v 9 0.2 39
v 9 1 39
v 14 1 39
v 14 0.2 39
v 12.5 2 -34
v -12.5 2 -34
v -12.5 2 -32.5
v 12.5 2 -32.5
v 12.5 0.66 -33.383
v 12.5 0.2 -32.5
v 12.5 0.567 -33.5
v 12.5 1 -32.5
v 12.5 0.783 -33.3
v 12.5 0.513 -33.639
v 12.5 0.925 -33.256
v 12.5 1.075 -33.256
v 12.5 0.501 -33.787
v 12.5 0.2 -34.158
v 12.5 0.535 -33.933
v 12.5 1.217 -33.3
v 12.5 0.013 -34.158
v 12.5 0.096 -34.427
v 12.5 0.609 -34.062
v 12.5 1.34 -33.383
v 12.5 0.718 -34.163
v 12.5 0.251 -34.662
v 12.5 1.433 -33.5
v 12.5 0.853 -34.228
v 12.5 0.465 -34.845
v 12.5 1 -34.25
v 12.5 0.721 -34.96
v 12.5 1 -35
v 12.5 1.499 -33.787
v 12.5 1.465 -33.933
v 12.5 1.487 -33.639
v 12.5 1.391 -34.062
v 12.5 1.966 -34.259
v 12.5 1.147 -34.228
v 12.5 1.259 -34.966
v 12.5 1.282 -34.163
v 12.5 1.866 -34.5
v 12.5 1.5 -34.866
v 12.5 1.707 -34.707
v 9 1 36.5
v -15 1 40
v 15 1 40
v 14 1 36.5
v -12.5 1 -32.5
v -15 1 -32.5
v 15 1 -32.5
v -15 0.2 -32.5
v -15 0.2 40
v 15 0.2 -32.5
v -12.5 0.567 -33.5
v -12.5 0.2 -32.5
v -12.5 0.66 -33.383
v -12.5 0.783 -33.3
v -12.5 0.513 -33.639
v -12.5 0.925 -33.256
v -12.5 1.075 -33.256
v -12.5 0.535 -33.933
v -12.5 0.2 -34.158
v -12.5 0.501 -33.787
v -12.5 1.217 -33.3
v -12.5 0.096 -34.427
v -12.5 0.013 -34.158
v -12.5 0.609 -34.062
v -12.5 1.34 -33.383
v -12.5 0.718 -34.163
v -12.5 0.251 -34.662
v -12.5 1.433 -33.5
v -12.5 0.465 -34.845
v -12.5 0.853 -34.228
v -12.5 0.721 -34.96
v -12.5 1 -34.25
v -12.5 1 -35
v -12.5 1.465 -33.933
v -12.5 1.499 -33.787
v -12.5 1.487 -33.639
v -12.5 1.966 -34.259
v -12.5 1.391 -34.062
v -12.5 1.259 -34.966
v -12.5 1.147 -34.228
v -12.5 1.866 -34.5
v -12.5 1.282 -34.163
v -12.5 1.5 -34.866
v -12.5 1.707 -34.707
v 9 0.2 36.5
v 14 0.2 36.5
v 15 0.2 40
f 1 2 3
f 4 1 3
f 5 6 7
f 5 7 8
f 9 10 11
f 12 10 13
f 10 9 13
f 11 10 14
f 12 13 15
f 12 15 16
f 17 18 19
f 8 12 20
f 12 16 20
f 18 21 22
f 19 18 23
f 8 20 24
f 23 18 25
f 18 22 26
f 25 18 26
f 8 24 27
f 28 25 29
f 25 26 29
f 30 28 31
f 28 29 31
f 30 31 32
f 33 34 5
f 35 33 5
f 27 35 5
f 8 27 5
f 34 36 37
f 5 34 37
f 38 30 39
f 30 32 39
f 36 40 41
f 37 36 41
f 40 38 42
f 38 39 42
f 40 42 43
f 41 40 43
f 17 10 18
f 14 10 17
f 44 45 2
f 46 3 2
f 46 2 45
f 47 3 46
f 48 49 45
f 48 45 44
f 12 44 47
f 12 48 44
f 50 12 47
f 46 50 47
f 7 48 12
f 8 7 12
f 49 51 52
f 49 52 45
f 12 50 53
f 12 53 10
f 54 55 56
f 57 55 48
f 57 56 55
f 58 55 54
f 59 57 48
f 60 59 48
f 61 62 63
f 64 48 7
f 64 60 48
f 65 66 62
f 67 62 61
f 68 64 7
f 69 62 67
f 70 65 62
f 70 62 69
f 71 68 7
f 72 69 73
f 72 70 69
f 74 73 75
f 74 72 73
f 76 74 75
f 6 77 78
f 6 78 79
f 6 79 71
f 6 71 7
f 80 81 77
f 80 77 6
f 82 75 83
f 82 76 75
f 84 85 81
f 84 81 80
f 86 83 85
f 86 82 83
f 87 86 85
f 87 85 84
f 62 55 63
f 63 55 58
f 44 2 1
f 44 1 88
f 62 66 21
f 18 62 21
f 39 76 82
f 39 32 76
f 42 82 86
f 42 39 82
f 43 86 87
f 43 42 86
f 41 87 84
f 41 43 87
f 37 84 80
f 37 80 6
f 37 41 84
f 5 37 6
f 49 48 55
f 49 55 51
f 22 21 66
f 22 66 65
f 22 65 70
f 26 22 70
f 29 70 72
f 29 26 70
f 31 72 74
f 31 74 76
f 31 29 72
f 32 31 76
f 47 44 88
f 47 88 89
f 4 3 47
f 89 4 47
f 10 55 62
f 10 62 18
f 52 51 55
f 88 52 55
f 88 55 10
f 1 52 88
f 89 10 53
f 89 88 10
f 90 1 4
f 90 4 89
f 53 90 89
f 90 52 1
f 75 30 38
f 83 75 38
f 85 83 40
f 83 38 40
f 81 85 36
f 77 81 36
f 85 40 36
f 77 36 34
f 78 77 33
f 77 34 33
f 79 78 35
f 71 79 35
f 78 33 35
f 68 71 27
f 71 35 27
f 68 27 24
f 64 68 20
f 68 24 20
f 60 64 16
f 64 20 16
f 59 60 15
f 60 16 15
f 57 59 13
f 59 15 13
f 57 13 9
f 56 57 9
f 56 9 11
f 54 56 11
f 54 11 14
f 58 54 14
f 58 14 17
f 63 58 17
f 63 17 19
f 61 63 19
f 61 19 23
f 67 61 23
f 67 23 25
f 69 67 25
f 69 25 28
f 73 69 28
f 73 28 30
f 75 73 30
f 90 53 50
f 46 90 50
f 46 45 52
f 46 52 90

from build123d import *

# Parameters (mm, degrees)
SKETCH1_W           = 30
SKETCH1_H           = 70
BOSS_EXTRUDE1_DEPTH = 1
SKETCH2_W           = 30
SKETCH2_H           = 2.5
BOSS_EXTRUDE2_DEPTH = 1
SKETCH3_R           = 0.5
CUT_EXTRUDE1_DEPTH  = 30
SKETCH4_W           = 2.5
SKETCH4_H           = 2
CUT_EXTRUDE2_DEPTH  = 2.5
FILLET1_R           = 1
SKETCH5_W           = 30
SKETCH5_H           = 1
BOSS_EXTRUDE3_DEPTH = 5
FILLET2_R           = 1
SKETCH6_W           = 5
SKETCH6_H           = 2.5
CUT_EXTRUDE3_DEPTH  = 1
SKETCH7_W           = 30
SKETCH7_H           = 74.158210877
CUT_EXTRUDE4_DEPTH  = 0.2


with BuildPart() as part:
    # Sketch1 → Boss-Extrude1 (new body)
    with BuildSketch(Plane(origin=(0, 0, 0), x_dir=(1, 0, 0), z_dir=(0, 1, 0))):
        Rectangle(SKETCH1_W, SKETCH1_H)
    extrude(amount=BOSS_EXTRUDE1_DEPTH)

    # Sketch2 → Boss-Extrude2 (add)
    with BuildSketch(Plane(origin=(0, 1, 0), x_dir=(1, 0, 0), z_dir=(0, 1, 0))):
        with Locations((0, 33.75)):
            Rectangle(SKETCH2_W, SKETCH2_H)
    extrude(amount=BOSS_EXTRUDE2_DEPTH)

    # Sketch3 → Cut-Extrude1 (cut)
    with BuildSketch(Plane(origin=(15, 0, 0), x_dir=(0, 0, -1), z_dir=(1, 0, 0))):
        with Locations((33.75, 1)):
            Circle(SKETCH3_R)
    extrude(amount=-CUT_EXTRUDE1_DEPTH, mode=Mode.SUBTRACT)

    # Sketch4 → Cut-Extrude2 (cut)
    with BuildSketch(Plane(origin=(0, 0, -35), x_dir=(-1, 0, 0), z_dir=(0, 0, -1))):
        with Locations((-13.75, 1)):
            Rectangle(SKETCH4_W, SKETCH4_H)
        with Locations((13.75, 1)):
            Rectangle(SKETCH4_W, SKETCH4_H)
    extrude(amount=-CUT_EXTRUDE2_DEPTH, mode=Mode.SUBTRACT)

    # Fillet1
    fillet1_edges = [part.edges().sort_by_distance(p)[0] for p in [
        (0, 2, -35),
    ]]
    fillet(fillet1_edges, radius=FILLET1_R)

    # Sketch5 → Boss-Extrude3 (add)
    with BuildSketch(Plane.XY.offset(35)):
        with Locations((0, 0.5)):
            Rectangle(SKETCH5_W, SKETCH5_H)
    extrude(amount=BOSS_EXTRUDE3_DEPTH)

    # Fillet2
    fillet2_edges = [part.edges().sort_by_distance(p)[0] for p in [
        (0, 0, -35),
    ]]
    fillet(fillet2_edges, radius=FILLET2_R - 0.0001)  # a hair under: the kernel refuses the full size

    # Sketch6 → Cut-Extrude3 (cut)
    with BuildSketch(Plane(origin=(0, 1, 0), x_dir=(1, 0, 0), z_dir=(0, 1, 0))):
        with Locations((11.5, -37.75)):
            Rectangle(SKETCH6_W, SKETCH6_H)
    extrude(amount=-CUT_EXTRUDE3_DEPTH, mode=Mode.SUBTRACT)

    # Sketch7 → Cut-Extrude4 (cut)
    with BuildSketch(Plane.XZ):
        with Locations((0, 2.920894561)):
            Rectangle(SKETCH7_W, SKETCH7_H)
    extrude(amount=-CUT_EXTRUDE4_DEPTH, mode=Mode.SUBTRACT)


solid = part.part
